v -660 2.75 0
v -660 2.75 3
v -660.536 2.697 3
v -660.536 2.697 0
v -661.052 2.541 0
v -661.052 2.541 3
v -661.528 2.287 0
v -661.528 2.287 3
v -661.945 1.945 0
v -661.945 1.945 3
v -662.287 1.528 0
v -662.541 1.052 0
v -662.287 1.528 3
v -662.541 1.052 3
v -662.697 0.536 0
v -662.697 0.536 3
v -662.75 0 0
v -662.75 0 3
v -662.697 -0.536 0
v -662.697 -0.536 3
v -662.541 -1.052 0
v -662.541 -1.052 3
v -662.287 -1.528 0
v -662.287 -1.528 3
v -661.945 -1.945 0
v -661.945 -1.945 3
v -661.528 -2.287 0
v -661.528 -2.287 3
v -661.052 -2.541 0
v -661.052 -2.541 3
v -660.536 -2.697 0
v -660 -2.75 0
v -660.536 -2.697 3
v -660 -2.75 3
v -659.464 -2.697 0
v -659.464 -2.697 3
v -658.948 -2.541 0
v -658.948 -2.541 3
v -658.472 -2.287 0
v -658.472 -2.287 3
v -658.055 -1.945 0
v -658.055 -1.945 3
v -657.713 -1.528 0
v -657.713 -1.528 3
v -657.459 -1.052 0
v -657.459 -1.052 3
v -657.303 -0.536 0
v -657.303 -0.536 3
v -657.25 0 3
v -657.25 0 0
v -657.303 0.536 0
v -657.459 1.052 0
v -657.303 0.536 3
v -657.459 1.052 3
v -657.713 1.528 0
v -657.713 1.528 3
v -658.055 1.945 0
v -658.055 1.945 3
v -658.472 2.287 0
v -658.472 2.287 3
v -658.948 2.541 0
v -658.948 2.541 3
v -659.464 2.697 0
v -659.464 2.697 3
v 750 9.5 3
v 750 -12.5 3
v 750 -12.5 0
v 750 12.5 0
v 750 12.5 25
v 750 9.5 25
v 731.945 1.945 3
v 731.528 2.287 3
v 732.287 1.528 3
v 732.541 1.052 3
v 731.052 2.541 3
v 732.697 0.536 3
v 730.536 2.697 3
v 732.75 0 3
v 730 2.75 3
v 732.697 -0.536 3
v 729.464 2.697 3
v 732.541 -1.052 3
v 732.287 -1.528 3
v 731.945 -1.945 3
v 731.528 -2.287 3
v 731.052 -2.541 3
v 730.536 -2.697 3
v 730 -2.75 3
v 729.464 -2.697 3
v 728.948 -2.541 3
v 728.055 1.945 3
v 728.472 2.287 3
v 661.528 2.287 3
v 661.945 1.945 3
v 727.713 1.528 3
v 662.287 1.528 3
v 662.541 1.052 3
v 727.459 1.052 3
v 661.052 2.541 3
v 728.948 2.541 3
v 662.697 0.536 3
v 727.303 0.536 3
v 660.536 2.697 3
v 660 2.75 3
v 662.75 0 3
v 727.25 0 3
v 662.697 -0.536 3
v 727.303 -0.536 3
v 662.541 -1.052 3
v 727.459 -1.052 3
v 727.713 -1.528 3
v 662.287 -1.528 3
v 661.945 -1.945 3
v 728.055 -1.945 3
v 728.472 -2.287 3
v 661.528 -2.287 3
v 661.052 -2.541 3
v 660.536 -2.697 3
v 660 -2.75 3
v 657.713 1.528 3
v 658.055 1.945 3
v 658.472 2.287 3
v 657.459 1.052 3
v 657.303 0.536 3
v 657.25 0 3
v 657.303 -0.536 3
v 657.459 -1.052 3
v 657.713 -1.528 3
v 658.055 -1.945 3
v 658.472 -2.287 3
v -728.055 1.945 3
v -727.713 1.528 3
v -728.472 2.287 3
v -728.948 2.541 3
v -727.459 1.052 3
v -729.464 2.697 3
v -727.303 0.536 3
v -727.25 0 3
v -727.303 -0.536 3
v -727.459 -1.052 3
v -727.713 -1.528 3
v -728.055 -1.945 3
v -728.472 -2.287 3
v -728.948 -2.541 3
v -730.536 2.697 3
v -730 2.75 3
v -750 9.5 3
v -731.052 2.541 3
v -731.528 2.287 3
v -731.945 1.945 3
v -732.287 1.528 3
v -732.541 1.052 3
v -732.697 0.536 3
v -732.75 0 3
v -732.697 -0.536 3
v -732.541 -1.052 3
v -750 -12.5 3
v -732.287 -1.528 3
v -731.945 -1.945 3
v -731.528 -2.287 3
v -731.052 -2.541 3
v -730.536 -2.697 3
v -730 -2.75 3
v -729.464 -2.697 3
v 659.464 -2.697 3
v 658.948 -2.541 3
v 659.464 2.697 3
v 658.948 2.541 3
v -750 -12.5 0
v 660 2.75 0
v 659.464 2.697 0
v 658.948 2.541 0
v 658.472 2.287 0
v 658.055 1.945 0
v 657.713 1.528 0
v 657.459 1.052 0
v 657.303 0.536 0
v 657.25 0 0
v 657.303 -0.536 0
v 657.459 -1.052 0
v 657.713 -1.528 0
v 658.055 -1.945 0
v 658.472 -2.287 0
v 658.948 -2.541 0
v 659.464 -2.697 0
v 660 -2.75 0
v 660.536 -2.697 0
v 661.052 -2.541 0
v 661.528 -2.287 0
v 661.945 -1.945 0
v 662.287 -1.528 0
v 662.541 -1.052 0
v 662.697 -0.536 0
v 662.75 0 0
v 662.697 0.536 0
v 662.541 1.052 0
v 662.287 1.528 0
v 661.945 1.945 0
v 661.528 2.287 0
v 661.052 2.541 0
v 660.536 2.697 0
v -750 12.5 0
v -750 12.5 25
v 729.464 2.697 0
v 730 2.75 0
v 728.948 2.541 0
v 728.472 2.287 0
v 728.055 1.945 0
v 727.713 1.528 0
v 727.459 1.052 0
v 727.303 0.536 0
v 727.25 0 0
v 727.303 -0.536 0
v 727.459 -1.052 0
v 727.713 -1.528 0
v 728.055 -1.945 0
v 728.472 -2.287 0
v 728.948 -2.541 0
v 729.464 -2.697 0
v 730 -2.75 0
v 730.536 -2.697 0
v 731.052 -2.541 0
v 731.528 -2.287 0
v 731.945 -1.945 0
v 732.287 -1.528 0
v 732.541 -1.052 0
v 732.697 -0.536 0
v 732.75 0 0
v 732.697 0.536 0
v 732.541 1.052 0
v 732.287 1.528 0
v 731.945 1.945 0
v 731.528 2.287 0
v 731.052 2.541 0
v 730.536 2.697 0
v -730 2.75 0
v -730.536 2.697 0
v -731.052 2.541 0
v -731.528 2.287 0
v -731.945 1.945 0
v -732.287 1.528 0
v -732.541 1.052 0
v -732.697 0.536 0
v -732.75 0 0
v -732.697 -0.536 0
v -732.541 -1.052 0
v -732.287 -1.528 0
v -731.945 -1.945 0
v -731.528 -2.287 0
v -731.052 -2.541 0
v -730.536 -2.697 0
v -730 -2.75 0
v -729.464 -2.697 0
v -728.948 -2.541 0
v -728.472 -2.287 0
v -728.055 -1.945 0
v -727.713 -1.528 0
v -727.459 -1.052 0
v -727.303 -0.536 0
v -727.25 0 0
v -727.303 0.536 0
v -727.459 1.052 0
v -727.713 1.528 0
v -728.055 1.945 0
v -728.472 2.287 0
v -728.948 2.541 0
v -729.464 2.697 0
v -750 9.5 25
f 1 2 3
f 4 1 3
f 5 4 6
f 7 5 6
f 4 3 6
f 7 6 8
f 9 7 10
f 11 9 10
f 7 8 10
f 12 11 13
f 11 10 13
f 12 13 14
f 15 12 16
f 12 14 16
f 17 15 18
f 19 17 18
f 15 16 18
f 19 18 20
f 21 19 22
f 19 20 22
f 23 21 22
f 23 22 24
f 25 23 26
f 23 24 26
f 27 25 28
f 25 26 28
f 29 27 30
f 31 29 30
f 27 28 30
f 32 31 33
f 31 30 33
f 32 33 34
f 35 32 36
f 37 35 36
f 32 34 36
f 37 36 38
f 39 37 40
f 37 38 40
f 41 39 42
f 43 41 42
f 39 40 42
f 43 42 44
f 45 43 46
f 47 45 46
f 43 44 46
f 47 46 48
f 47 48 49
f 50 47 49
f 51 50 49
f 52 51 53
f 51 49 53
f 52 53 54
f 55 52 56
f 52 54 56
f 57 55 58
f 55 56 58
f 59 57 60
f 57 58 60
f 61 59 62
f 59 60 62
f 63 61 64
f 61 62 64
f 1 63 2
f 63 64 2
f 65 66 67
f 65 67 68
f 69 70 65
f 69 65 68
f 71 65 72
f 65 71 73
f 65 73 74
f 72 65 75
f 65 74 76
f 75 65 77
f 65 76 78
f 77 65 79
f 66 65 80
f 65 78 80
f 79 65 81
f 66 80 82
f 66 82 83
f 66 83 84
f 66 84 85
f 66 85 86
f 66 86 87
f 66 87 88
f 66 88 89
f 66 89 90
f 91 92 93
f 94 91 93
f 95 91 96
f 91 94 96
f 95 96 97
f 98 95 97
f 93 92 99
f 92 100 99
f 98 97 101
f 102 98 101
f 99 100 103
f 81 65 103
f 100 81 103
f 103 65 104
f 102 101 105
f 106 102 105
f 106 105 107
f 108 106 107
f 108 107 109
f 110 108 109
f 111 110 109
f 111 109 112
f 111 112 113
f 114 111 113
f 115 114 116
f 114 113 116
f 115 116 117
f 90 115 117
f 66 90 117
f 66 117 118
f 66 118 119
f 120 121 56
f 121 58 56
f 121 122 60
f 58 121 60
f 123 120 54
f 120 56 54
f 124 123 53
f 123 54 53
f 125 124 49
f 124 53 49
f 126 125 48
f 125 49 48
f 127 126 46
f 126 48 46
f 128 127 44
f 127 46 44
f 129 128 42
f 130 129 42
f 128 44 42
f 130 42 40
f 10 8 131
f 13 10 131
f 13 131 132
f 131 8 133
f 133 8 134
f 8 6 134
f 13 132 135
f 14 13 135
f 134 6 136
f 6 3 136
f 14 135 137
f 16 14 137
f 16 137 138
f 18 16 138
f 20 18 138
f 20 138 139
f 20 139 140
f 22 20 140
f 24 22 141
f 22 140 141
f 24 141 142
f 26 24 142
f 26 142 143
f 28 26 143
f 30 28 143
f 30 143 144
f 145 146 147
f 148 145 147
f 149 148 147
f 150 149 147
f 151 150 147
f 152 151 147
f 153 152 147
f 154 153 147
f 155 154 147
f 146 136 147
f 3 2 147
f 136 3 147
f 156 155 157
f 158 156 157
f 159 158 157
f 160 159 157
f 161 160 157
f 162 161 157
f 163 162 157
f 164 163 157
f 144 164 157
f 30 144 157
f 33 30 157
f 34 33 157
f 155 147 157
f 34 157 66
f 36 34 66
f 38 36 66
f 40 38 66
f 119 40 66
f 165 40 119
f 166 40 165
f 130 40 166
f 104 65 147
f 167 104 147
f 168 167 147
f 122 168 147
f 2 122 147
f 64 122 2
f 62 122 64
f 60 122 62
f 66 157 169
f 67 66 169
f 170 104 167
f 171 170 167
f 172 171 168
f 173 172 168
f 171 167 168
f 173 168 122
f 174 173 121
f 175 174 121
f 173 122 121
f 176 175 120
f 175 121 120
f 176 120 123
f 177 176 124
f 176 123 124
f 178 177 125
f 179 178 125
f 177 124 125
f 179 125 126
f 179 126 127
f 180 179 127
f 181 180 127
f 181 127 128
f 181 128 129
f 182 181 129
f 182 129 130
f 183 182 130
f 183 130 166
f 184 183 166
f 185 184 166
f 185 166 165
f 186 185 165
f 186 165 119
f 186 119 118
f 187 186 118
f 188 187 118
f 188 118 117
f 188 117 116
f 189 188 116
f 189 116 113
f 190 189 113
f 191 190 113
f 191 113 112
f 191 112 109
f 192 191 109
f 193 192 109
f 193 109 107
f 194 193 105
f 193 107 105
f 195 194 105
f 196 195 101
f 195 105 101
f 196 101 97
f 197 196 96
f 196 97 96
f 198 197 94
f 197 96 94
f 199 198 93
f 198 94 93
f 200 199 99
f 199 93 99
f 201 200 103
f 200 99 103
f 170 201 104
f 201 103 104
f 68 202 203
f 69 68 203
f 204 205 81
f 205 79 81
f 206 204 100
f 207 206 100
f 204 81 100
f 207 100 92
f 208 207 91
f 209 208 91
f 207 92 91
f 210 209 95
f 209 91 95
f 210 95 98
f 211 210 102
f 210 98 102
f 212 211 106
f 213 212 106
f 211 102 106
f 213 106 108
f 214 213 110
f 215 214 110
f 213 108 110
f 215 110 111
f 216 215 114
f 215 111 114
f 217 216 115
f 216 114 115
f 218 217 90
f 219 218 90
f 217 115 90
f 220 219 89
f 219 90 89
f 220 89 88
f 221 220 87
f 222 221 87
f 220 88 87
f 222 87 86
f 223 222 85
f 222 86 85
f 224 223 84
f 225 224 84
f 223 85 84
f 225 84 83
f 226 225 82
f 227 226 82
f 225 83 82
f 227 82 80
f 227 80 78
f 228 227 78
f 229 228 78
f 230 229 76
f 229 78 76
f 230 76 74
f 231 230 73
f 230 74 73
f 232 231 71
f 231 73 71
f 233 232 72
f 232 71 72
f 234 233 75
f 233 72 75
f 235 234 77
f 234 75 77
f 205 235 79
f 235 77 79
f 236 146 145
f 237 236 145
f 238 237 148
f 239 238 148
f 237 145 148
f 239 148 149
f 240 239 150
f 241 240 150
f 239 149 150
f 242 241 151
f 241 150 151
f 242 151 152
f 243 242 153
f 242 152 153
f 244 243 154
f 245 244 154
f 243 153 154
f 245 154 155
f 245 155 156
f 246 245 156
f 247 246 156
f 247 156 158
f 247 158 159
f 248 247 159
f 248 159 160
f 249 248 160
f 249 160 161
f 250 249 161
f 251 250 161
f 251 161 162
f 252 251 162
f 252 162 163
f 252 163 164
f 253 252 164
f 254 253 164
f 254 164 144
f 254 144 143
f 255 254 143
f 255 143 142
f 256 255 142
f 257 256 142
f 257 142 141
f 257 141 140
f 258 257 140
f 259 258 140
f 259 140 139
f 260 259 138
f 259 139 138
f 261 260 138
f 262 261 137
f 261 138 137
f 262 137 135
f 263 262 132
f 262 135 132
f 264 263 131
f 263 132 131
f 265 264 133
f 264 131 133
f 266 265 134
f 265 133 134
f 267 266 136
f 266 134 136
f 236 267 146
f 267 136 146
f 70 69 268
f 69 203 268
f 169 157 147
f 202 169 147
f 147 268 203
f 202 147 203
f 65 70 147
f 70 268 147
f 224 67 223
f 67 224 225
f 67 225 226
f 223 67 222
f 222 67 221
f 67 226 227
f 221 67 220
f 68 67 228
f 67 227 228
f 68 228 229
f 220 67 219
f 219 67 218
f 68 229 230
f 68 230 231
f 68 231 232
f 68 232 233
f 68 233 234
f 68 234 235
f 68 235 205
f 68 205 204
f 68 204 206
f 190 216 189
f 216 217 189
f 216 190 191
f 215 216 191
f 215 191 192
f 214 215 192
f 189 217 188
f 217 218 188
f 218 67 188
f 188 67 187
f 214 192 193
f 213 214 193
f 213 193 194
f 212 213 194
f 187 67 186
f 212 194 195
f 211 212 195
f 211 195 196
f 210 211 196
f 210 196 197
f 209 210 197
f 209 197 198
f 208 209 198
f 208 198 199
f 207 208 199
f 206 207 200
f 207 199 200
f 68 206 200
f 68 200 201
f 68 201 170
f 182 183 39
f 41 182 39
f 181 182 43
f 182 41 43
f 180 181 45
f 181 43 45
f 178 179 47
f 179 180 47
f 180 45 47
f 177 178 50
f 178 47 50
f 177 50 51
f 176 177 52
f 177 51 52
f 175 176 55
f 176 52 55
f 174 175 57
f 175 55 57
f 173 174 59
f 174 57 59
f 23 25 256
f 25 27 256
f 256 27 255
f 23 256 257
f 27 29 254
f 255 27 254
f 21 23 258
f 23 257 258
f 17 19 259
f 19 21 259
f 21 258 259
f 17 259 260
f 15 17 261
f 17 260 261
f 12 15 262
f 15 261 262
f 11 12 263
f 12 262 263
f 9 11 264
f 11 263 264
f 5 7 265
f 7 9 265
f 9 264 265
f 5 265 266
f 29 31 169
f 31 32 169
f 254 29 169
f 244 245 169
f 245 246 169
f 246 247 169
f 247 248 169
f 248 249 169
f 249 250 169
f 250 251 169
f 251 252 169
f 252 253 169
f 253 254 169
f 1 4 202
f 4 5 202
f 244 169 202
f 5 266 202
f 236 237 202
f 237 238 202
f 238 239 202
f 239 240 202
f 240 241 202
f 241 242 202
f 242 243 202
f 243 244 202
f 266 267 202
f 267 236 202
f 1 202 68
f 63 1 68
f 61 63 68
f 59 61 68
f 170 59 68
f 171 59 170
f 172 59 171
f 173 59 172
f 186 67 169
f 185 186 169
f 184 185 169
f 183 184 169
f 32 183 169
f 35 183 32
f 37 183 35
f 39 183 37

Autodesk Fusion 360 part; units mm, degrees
sketch "Sketch1" plane through (0, 0, 0) normal (1, 0, 0) x (0, 1, 0)
  line L0 (-12.5, 0) -> (12.5, 0)
  line L1 (12.5, 0) -> (12.5, 25)
  line L2 (12.5, 25) -> (9.5, 25)
  line L3 (9.5, 25) -> (9.5, 3)
  line L4 (9.5, 3) -> (-12.5, 3)
  line L5 (-12.5, 3) -> (-12.5, 0)
  dimension "d2" = 25
  dimension "d3" = 25
  dimension "d4" = 3
  dimension "d5" = 22
  dimension "d6" = 22
extrude "Extrude1" add sketch "Sketch1" along normal mid plane 1500
sketch "Sketch2" plane through (0, 0, 0) normal (0, 0, -1) x (1, 0, 0)
  line L0 (-750, -12.5) -> (750, -12.5)
  line L1 (750, -12.5) -> (750, 12.5)
  line L2 (750, 12.5) -> (-750, 12.5)
  line L3 (-750, 12.5) -> (-750, -12.5)
  line L4 (-750, 0) -> (-730, 0) construction
  line L5 (-730, 0) -> (-660, 0) construction
  line L6 (750, 0) -> (730, 0) construction
  line L7 (730, 0) -> (660, 0) construction
  dimension "d9" = 20
  dimension "d10" = 70
  dimension "d11" = 20
  dimension "d12" = 70
hole "Hole1" at (-660, 0, 0) at (-730, 0, 0) at (730, 0, 0) at (660, 0, 0) direction (0, 0, 1) diameter 5.5 depth 3 tip angle 180
